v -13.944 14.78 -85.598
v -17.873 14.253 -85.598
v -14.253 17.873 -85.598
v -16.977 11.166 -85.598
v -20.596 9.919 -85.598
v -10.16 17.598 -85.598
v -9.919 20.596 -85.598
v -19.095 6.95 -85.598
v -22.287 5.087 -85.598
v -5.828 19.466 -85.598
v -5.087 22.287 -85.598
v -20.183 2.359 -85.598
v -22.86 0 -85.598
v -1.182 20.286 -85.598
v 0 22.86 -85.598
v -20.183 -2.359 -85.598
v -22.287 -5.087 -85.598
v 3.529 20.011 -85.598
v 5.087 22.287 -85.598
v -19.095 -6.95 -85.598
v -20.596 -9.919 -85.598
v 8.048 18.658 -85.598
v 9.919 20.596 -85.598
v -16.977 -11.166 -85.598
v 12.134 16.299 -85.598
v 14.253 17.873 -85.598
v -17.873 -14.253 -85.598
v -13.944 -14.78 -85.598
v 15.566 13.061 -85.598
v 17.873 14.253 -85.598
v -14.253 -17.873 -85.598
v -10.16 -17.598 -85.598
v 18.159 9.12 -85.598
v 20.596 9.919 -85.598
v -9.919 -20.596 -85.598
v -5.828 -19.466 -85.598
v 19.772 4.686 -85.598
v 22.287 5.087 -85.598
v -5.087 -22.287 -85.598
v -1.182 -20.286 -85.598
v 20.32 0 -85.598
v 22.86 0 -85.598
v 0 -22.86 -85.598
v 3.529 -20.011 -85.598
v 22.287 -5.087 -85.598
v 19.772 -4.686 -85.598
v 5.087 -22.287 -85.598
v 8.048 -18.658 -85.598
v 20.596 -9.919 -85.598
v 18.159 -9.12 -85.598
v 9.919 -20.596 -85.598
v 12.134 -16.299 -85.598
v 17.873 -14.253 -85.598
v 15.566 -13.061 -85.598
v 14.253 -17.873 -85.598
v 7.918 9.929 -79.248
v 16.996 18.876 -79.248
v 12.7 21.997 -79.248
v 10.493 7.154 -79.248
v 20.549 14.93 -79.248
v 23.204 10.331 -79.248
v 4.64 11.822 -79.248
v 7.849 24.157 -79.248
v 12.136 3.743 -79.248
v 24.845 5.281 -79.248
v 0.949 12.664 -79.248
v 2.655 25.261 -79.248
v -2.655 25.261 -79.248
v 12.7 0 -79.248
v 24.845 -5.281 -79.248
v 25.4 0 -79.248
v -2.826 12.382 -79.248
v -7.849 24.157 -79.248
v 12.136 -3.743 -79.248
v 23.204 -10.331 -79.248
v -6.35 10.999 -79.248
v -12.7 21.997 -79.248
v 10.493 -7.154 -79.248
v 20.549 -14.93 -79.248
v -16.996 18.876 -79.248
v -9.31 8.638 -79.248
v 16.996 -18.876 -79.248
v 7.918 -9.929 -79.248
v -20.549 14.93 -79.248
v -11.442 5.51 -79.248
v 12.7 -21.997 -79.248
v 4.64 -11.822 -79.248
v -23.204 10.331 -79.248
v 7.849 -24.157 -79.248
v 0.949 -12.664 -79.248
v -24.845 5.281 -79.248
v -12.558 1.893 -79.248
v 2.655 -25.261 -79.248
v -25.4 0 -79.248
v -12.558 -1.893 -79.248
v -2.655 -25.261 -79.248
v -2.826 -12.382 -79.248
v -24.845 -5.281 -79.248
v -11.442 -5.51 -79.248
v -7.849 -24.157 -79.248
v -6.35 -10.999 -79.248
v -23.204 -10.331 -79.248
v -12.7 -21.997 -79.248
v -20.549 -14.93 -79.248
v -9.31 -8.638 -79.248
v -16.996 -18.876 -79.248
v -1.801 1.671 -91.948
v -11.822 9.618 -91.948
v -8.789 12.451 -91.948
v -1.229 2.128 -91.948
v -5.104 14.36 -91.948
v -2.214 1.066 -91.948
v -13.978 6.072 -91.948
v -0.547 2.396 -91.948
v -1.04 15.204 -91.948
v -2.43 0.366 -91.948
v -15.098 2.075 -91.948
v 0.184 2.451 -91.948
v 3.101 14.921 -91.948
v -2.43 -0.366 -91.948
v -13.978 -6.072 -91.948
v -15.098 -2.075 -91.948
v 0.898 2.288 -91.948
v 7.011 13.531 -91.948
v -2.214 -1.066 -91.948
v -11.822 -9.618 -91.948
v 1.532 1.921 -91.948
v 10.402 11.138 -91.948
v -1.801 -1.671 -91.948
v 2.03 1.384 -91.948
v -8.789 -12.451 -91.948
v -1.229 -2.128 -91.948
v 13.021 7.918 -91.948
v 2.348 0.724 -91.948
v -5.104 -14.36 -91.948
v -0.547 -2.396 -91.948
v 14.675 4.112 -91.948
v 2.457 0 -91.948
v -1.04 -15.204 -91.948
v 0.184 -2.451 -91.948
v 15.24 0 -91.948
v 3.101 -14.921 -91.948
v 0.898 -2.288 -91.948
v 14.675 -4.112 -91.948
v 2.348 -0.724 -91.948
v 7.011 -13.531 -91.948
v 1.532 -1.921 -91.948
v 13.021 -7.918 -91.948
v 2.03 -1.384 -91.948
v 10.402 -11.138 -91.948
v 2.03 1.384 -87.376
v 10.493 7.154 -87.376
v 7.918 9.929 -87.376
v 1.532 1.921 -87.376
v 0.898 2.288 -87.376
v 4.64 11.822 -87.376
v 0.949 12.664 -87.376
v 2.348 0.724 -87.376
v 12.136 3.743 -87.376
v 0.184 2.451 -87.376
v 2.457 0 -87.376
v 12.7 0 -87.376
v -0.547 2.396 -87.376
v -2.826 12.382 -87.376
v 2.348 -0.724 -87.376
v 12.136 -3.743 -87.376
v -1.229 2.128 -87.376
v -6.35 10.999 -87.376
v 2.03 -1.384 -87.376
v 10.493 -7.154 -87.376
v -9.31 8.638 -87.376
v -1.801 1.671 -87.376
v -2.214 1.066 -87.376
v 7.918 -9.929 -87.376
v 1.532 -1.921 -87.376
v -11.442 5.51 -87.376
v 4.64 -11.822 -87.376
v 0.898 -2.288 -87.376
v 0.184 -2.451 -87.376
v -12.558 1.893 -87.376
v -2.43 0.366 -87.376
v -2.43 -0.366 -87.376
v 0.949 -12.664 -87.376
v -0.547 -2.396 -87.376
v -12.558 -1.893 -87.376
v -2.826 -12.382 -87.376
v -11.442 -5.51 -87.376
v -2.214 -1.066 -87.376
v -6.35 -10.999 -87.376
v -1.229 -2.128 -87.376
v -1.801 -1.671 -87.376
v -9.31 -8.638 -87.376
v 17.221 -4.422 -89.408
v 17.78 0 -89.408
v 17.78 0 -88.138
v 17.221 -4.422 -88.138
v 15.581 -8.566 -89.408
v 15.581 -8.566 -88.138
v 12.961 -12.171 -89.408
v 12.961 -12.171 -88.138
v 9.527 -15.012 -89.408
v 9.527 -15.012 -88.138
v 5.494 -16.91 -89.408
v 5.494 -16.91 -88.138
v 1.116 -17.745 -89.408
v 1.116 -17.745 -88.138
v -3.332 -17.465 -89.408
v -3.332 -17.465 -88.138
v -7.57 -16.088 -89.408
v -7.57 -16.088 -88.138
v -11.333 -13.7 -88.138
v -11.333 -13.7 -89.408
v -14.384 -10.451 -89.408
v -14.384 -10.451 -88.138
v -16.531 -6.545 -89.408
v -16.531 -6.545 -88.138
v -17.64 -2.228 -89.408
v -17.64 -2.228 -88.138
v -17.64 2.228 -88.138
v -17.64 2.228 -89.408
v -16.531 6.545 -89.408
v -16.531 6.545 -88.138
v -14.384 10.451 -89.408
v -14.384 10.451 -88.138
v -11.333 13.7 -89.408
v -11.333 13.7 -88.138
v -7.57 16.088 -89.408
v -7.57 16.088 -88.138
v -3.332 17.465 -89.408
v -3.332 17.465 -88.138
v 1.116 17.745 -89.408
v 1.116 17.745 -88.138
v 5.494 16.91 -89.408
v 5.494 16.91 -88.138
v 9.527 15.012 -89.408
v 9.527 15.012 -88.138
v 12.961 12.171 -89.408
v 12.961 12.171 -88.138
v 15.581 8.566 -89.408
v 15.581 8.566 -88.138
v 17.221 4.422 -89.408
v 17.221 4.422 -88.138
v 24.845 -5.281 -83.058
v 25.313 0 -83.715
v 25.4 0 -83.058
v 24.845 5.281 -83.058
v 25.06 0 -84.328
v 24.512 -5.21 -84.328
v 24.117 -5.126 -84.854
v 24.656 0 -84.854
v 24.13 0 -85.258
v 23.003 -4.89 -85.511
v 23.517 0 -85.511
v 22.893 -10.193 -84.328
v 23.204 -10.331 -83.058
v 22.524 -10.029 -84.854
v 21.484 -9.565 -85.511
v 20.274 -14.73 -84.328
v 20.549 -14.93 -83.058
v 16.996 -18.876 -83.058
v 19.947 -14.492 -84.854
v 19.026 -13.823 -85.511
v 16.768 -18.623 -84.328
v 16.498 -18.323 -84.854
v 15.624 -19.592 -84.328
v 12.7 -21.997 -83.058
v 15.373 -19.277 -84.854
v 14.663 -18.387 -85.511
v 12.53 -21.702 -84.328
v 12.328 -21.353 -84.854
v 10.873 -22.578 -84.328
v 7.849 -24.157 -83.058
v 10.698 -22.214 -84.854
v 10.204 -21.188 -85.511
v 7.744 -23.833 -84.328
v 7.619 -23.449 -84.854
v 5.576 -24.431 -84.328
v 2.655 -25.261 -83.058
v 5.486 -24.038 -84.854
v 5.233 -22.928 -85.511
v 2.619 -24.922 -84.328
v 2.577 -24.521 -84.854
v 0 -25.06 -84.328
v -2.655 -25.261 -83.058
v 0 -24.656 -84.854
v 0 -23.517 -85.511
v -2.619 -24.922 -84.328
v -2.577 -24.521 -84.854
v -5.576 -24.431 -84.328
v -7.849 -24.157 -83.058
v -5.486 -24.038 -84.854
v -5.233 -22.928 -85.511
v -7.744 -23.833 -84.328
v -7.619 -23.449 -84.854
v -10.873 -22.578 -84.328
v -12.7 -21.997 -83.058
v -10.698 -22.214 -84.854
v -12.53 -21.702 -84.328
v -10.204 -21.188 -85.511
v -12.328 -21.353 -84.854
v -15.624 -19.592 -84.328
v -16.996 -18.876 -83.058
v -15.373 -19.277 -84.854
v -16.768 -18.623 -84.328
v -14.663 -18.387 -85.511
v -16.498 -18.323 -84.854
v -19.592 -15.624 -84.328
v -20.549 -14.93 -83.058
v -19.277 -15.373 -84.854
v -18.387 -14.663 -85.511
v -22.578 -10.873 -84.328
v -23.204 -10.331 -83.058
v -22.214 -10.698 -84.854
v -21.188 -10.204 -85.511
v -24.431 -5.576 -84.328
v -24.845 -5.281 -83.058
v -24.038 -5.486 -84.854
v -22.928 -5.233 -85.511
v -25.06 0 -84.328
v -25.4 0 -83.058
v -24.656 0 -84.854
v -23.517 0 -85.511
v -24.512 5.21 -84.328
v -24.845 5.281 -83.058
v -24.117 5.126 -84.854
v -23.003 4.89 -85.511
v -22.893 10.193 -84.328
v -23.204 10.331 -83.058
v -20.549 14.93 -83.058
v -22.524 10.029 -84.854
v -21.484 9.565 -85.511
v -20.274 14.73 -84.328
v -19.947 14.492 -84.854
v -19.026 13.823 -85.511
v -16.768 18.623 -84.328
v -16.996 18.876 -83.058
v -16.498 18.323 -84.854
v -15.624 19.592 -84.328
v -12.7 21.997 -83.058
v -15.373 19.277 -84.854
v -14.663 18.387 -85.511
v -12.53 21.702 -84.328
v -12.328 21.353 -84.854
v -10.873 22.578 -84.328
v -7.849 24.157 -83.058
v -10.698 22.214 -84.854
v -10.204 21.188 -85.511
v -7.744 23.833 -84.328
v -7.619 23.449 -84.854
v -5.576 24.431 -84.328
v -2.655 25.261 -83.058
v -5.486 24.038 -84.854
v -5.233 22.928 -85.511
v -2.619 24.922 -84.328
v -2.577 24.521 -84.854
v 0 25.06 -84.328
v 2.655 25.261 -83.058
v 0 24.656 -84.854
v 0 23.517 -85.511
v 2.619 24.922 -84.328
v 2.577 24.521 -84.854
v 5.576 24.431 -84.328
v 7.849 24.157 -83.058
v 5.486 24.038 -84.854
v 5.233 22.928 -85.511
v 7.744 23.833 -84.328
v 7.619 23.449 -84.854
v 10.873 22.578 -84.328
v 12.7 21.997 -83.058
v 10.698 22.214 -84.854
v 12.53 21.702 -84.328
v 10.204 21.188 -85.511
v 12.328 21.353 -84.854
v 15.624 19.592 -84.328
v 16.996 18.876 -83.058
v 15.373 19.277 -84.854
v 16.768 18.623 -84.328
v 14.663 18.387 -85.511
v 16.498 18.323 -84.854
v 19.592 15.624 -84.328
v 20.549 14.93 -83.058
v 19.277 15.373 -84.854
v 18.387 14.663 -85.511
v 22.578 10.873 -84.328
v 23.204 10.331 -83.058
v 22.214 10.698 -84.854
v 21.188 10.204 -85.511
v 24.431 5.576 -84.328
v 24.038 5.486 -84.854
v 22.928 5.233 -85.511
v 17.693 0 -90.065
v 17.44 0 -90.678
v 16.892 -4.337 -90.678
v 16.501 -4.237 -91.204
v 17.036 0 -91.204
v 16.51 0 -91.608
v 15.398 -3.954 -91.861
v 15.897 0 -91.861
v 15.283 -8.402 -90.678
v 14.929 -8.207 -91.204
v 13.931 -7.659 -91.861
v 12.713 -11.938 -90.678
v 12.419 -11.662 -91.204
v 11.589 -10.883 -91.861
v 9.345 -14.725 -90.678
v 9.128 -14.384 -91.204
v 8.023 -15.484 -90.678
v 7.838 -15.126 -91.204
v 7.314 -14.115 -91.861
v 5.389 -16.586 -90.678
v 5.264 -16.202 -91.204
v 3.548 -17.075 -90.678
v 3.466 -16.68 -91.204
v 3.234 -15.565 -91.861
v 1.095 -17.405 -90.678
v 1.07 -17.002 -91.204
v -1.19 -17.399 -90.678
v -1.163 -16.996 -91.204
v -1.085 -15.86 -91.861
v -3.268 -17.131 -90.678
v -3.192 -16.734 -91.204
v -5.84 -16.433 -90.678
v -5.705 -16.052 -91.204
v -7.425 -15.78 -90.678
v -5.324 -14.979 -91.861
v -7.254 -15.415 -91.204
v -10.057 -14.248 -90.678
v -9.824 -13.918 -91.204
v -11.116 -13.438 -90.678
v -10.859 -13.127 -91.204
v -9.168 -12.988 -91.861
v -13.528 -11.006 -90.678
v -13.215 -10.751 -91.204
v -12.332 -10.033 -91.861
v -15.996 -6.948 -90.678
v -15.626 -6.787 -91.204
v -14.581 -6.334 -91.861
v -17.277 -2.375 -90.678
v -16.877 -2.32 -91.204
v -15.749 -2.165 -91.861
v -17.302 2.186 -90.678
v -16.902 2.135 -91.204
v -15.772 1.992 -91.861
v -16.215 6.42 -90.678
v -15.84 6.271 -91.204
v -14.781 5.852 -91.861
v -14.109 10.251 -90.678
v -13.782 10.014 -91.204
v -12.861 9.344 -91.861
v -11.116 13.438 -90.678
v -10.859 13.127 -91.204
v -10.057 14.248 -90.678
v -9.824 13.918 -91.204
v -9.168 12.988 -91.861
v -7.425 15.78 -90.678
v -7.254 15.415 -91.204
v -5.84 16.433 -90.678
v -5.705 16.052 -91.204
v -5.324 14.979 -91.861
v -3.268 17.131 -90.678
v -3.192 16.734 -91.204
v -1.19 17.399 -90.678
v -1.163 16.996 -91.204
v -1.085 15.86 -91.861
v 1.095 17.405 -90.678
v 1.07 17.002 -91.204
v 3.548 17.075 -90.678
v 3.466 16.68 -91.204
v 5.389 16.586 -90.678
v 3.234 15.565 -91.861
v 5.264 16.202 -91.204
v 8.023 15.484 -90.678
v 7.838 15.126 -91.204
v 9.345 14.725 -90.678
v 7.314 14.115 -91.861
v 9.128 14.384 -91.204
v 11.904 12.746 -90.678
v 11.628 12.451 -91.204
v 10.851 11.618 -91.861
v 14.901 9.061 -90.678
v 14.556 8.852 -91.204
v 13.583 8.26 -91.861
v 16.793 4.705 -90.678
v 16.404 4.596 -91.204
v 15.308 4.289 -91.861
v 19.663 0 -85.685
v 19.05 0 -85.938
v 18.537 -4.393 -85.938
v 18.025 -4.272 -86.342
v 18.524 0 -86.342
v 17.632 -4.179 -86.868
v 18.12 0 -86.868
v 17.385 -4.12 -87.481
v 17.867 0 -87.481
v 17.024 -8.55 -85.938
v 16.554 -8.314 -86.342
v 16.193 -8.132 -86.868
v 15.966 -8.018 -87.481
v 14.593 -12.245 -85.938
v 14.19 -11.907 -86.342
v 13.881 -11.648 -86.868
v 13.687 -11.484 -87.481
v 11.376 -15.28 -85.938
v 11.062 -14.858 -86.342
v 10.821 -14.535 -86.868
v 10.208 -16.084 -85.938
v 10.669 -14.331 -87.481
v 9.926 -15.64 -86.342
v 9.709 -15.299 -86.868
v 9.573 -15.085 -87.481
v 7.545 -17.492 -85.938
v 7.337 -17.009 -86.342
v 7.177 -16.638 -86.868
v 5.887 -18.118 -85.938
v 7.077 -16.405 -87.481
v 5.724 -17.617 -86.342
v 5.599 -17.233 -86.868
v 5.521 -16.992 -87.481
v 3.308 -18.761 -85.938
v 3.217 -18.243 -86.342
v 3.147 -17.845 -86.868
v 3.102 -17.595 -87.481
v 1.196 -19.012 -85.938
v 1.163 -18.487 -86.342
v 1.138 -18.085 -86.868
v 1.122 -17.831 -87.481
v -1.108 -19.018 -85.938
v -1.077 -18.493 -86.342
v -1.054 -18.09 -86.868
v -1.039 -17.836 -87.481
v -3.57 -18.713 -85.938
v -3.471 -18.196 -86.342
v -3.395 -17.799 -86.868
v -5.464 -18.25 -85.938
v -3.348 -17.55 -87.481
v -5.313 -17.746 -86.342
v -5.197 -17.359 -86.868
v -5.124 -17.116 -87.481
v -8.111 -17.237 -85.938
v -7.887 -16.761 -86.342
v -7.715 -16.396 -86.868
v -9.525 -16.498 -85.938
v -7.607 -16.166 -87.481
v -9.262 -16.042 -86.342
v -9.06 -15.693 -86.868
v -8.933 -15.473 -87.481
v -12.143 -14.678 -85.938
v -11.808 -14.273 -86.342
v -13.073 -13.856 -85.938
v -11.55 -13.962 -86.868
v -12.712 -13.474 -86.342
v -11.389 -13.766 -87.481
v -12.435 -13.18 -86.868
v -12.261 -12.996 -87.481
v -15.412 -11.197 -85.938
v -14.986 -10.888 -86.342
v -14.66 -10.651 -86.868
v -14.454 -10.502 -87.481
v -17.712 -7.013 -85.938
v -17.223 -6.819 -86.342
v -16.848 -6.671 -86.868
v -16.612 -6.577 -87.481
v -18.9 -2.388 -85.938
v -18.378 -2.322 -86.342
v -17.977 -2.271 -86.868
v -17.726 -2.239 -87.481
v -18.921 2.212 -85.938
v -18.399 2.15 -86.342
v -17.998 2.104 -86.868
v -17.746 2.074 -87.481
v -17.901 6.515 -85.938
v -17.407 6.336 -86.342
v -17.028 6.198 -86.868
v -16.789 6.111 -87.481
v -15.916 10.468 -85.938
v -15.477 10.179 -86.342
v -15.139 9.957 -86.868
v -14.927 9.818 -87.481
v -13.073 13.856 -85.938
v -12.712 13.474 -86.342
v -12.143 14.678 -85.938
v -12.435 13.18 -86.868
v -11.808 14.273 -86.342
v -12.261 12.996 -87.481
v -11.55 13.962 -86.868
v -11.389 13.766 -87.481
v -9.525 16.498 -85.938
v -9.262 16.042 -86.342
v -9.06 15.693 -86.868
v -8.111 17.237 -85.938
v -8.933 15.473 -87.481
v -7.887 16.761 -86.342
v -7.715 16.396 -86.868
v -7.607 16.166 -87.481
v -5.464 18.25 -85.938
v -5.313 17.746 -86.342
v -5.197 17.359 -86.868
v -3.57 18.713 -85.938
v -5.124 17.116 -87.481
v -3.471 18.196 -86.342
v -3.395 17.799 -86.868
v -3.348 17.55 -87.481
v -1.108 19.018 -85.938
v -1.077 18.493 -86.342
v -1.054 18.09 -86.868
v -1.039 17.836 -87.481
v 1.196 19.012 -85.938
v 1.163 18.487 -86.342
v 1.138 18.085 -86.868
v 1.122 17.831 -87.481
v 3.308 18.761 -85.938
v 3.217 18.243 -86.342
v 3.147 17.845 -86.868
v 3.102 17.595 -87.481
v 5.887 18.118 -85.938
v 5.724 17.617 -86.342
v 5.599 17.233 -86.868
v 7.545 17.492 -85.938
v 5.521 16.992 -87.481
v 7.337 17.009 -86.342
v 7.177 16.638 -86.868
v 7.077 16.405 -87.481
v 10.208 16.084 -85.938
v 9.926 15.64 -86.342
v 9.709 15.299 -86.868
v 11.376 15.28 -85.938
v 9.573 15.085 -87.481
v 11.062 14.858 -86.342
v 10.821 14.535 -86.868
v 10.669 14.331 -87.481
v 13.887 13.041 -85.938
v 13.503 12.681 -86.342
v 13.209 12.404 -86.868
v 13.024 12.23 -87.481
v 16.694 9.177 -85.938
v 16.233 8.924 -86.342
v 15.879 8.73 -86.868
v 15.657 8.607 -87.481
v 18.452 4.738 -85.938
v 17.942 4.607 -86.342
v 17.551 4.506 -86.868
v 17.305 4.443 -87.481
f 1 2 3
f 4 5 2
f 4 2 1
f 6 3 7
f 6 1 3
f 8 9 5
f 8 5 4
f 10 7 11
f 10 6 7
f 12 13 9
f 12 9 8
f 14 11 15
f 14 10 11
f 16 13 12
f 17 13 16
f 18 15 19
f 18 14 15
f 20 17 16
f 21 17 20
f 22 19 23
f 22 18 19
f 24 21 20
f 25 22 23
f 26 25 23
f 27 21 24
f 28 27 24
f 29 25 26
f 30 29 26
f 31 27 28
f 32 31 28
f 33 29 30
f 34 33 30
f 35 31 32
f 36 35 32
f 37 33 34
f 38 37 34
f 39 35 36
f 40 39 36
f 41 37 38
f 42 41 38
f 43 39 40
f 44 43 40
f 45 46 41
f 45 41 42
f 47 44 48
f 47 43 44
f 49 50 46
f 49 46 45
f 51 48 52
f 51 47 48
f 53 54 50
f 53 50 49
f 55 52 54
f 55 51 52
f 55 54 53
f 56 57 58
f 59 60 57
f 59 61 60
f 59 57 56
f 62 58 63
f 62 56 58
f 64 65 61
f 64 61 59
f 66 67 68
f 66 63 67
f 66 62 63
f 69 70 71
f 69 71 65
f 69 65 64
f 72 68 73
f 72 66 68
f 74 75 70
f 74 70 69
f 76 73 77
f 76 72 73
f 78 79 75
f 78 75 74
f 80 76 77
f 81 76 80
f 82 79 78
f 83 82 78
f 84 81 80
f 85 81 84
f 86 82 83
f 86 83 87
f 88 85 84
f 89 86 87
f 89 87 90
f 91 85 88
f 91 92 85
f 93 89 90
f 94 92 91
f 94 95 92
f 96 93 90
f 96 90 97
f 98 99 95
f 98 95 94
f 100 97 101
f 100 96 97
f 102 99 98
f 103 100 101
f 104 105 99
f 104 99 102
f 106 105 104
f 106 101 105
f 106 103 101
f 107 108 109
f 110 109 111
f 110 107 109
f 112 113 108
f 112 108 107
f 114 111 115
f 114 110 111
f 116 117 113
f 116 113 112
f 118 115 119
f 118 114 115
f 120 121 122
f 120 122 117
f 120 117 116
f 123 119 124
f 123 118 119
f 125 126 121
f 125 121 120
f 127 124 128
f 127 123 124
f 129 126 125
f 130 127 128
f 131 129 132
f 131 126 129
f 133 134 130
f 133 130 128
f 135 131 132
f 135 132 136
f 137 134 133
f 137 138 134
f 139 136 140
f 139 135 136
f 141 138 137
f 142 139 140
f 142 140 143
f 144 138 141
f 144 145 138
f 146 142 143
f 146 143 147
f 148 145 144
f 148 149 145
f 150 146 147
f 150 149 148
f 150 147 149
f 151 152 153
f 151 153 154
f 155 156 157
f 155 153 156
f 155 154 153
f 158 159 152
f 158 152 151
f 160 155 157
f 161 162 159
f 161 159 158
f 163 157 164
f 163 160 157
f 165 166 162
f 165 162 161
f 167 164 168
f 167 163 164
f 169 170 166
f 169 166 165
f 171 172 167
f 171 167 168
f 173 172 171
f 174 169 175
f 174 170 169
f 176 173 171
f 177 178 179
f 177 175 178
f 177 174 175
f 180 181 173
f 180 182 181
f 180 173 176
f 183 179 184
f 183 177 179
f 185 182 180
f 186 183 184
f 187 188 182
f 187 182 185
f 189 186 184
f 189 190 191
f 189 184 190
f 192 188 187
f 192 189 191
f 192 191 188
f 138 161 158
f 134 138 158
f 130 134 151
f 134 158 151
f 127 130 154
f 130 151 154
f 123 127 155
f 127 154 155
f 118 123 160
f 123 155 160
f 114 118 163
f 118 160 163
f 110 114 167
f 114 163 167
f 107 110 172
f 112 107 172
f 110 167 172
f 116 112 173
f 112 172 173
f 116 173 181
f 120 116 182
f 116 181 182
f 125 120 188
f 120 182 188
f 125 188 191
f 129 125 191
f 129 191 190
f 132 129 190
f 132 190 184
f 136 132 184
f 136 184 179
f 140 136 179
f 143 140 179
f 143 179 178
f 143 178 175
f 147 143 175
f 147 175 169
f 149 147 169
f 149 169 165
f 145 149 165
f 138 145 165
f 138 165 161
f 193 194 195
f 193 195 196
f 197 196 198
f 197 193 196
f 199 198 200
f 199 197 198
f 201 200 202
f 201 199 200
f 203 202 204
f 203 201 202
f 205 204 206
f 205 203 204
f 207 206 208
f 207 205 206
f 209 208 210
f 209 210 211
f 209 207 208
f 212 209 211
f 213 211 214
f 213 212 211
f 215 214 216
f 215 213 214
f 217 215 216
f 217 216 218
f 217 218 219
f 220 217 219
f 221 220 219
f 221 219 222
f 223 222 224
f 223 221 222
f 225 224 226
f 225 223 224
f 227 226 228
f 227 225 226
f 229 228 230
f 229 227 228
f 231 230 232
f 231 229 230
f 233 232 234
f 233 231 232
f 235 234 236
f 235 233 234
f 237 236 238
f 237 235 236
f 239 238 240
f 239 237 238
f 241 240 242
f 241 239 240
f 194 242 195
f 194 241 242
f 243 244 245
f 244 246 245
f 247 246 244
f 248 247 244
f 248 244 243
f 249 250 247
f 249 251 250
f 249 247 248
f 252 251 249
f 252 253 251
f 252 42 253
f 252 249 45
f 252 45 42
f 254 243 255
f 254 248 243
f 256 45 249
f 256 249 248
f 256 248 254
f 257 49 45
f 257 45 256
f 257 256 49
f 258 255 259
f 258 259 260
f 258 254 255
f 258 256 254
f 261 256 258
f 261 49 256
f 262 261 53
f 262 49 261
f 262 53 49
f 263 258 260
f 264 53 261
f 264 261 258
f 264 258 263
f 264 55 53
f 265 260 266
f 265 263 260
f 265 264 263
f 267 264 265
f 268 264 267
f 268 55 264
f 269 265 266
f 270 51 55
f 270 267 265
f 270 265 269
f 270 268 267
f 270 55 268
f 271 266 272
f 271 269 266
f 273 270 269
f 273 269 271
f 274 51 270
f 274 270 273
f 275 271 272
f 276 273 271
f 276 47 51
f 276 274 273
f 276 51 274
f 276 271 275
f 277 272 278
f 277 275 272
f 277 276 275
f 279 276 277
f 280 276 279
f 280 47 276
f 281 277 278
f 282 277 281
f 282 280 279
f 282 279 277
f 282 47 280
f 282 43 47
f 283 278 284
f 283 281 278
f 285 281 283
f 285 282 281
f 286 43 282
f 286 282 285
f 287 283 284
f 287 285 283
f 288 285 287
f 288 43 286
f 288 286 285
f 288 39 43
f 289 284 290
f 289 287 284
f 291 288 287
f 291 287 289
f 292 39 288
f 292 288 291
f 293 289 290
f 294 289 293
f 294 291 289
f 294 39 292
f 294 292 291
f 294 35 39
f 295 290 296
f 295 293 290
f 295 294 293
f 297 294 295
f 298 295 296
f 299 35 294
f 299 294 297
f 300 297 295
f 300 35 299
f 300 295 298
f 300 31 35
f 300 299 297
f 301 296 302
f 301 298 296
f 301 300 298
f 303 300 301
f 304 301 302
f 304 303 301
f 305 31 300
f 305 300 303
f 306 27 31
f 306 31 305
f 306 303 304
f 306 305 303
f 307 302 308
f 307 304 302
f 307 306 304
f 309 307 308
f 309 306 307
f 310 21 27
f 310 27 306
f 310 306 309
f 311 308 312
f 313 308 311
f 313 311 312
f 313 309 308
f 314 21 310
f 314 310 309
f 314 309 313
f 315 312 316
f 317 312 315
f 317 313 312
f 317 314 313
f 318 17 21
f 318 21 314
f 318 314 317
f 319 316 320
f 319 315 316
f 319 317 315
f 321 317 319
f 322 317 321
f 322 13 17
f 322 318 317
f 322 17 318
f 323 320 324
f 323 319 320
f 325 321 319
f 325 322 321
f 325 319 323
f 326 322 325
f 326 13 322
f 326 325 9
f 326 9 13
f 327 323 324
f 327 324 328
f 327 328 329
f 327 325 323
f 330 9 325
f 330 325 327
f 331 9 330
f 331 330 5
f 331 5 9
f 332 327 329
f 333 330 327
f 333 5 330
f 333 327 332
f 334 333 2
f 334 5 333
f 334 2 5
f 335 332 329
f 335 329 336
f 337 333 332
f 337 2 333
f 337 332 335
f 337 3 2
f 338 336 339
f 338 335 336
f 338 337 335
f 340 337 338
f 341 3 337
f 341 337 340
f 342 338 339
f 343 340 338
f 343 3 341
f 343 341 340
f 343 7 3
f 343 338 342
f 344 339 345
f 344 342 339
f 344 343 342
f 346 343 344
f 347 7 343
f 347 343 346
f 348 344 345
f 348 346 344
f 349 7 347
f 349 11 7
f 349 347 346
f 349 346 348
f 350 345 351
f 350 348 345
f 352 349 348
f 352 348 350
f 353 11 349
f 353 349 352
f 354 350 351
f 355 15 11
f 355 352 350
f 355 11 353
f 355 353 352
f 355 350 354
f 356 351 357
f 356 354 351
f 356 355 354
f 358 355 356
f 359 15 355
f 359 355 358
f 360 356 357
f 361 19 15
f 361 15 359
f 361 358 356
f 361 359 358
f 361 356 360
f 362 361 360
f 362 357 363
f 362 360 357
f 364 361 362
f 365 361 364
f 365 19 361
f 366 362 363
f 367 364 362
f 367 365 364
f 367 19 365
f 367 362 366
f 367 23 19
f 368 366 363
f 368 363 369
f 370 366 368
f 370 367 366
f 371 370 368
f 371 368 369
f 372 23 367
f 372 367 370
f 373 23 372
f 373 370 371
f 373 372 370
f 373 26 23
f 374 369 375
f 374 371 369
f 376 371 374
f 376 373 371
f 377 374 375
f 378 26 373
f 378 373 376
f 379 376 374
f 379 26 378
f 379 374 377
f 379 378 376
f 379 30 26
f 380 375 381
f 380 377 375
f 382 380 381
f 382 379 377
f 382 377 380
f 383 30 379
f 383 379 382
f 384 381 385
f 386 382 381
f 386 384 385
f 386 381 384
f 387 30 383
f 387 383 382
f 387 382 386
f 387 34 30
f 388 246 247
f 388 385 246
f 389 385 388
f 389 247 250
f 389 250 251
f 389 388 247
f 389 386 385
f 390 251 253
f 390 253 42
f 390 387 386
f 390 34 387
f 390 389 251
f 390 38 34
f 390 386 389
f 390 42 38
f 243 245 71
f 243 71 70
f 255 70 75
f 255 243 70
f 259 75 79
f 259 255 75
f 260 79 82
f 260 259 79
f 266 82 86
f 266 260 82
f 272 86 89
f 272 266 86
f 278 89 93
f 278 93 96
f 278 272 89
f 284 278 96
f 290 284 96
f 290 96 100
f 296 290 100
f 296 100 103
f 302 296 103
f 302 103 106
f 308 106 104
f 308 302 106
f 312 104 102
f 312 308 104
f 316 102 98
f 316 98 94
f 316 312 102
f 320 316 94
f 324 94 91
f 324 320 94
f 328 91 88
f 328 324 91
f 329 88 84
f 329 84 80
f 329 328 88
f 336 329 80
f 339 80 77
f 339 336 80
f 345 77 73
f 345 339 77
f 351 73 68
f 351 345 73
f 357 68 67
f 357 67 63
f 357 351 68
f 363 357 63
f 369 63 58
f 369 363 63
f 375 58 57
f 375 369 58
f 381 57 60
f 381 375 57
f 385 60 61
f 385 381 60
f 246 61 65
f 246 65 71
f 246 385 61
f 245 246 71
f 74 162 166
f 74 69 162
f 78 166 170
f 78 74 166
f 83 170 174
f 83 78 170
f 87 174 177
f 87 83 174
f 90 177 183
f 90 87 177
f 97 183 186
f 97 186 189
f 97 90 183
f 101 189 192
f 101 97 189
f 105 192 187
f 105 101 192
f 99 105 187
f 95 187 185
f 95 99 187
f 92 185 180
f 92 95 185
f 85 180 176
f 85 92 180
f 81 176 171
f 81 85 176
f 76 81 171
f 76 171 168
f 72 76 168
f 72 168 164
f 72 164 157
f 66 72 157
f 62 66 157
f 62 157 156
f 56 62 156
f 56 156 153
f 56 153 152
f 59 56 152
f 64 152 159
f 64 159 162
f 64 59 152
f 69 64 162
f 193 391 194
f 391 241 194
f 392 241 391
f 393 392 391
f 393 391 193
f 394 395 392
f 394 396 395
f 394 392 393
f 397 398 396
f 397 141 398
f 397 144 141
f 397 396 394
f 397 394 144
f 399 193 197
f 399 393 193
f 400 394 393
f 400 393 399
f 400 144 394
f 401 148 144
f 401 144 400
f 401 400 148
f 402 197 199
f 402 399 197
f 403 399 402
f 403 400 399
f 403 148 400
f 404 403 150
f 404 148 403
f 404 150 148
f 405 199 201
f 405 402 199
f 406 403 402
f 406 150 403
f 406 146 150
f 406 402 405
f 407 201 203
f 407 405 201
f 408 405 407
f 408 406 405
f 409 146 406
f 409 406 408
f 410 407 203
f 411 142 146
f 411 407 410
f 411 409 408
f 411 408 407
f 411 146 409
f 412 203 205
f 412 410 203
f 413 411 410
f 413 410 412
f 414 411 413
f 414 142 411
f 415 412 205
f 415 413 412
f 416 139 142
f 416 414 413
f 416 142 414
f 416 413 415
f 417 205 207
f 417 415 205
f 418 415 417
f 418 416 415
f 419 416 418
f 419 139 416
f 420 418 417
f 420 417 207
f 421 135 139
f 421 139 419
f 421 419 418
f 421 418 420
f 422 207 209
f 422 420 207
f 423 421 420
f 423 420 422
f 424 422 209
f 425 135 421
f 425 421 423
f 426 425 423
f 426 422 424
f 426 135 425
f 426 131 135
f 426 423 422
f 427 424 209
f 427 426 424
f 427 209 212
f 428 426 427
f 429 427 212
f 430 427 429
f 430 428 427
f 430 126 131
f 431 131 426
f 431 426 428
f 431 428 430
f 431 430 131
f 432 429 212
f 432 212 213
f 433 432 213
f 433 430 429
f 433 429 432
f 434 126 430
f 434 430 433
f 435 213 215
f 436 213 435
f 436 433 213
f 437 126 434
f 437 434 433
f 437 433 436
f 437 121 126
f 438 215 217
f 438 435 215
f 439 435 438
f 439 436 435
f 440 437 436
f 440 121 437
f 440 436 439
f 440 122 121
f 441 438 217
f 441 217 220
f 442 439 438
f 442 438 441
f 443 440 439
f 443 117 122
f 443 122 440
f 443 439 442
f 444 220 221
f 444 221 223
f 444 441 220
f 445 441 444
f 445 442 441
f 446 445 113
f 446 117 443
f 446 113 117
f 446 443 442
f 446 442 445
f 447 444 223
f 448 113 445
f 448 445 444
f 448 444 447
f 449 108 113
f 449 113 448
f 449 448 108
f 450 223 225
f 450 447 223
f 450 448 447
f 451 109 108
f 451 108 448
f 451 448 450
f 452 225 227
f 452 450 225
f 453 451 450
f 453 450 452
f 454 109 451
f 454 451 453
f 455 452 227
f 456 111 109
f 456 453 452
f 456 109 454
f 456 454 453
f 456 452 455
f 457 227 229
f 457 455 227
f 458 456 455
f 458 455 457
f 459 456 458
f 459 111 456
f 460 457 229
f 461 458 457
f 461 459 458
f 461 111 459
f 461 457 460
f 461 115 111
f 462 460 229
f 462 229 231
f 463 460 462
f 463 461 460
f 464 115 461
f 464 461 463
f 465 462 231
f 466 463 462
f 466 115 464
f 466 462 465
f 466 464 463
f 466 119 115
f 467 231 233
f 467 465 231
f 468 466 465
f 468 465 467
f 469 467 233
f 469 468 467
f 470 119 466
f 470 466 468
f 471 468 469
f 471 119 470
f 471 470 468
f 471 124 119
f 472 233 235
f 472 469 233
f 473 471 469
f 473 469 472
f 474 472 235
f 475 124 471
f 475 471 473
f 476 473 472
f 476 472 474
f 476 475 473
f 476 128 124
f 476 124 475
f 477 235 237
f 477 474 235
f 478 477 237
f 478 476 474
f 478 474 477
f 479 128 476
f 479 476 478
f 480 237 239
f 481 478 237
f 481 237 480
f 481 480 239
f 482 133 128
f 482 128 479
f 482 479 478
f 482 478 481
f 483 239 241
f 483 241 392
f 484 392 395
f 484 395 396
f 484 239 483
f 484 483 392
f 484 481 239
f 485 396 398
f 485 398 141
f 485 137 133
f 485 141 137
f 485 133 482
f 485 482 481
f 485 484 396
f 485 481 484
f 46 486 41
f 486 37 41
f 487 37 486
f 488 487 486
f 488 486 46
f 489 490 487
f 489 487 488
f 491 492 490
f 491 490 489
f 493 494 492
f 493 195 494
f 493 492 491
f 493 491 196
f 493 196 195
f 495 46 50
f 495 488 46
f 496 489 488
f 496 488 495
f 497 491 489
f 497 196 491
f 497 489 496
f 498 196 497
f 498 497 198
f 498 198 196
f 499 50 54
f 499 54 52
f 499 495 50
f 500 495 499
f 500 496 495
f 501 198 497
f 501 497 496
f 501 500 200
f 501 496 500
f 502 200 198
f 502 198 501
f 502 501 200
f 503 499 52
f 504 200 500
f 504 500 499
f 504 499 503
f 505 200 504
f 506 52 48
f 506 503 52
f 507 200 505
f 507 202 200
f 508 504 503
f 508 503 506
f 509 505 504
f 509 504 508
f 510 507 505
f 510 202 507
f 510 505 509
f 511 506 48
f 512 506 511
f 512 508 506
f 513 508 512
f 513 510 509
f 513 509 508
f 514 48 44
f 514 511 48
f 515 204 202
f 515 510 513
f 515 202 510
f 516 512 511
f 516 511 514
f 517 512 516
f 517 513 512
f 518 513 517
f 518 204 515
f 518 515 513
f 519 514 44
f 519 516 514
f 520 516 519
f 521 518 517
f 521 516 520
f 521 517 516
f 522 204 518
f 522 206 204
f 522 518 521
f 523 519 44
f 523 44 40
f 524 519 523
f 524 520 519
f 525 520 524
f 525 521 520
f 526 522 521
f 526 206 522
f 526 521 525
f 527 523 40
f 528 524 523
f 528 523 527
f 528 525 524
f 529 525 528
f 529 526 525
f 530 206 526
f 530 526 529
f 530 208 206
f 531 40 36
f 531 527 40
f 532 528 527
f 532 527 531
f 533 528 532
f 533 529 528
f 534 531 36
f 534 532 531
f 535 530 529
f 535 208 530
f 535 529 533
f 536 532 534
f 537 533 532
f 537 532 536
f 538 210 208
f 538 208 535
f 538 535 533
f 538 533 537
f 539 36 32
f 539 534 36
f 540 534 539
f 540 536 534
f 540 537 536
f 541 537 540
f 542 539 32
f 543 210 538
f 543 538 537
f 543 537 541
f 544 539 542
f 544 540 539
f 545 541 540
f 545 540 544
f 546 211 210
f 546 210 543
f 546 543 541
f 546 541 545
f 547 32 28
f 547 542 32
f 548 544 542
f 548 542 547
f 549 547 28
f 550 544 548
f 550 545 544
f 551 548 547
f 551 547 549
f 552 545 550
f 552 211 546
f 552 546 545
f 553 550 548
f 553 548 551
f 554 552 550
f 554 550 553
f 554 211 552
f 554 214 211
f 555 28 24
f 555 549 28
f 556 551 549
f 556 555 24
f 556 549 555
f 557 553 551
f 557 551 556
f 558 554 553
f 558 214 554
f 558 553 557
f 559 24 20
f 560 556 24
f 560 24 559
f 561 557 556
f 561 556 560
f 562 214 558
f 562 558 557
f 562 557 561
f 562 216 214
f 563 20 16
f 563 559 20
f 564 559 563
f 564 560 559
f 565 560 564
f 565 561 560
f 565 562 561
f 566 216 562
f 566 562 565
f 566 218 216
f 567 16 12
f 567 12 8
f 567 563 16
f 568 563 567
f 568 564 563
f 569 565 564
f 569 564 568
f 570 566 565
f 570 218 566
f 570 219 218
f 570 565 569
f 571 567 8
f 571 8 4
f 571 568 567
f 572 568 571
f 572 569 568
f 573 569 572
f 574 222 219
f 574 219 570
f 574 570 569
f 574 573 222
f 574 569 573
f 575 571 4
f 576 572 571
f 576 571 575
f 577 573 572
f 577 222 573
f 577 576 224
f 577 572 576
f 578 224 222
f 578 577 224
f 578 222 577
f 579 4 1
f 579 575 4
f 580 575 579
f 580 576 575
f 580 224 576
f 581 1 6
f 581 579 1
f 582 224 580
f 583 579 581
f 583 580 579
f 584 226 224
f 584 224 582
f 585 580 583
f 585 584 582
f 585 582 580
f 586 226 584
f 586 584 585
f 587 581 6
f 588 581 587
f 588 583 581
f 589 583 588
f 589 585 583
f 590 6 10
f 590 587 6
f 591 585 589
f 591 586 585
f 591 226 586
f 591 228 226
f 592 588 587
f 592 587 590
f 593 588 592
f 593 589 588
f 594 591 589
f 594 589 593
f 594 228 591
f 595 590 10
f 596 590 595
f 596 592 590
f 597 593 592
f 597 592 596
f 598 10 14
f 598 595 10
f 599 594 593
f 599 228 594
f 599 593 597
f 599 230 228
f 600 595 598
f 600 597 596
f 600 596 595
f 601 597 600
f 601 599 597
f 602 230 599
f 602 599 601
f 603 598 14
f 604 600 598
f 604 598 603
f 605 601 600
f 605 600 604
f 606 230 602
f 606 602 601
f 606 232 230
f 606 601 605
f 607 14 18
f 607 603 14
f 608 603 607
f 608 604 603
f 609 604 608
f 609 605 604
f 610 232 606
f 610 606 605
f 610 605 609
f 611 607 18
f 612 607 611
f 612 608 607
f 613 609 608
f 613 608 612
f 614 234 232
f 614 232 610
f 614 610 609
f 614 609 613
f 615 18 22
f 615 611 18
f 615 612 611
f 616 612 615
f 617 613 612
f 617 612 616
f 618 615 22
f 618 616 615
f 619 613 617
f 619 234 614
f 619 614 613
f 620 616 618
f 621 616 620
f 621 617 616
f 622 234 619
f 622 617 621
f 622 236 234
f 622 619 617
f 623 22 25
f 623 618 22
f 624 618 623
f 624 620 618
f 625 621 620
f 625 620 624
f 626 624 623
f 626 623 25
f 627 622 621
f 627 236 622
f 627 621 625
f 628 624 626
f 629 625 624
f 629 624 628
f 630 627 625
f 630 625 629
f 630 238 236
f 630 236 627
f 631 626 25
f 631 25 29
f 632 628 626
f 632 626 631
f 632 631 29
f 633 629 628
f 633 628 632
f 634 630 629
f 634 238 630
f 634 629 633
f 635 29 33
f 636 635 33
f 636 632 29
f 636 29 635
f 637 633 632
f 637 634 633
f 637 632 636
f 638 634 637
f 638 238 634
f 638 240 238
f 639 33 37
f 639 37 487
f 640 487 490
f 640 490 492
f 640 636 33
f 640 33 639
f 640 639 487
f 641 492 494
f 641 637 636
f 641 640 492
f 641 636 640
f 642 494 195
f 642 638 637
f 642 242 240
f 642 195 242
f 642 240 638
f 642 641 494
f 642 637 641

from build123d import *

# Parameters (mm, degrees)
FILLET1_R                        = 2.54
F_10_0_1935_DIAMETER_HOLE1_D     = 4.9149
F_10_0_1935_DIAMETER_HOLE1_DEPTH = 10.16
F_10_0_1935_DIAMETER_HOLE1_TIP   = 1.476584928


with BuildPart() as part:
    # Sketch1 → Revolve1 (revolve)
    with BuildSketch(Plane(origin=(0, 0, 0), x_dir=(0, 0, -1), z_dir=(1, 0, 0)), mode=Mode.PRIVATE) as revolve1_sk:
        Polygon((79.248, 12.7), (79.248, 25.4), (85.598, 25.4), (85.598, 17.78), (91.948, 17.78), (91.948, 0), (87.376, 0), (87.376, 12.7), align=None)
    revolve(revolve1_sk.sketch.rotate(Axis((0, 0, 0), (0, 0, -1)), 90), axis=Axis((0, 0, 0), (0, 0, -1)))

    # Fillet1
    fillet1_edges = [part.edges().sort_by_distance(p)[0] for p in [
        (-17.78, 0, -91.948),
        (-17.78, 0, -85.598),
        (-25.4, 0, -85.598),
    ]]
    fillet(fillet1_edges, radius=FILLET1_R)

    # #10 (0.1935) Diameter Hole1
    with Locations(Plane(origin=(0, 0, -91.948), x_dir=(-1, 0, 0), z_dir=(0, 0, -1))):
        with Locations((0, 0)):
            Hole(F_10_0_1935_DIAMETER_HOLE1_D / 2, depth=F_10_0_1935_DIAMETER_HOLE1_DEPTH)
            with Locations((0, 0, -(F_10_0_1935_DIAMETER_HOLE1_DEPTH + F_10_0_1935_DIAMETER_HOLE1_TIP / 2))):  # 118° drill point
                Cone(0, F_10_0_1935_DIAMETER_HOLE1_D / 2, F_10_0_1935_DIAMETER_HOLE1_TIP, mode=Mode.SUBTRACT)


solid = part.part
